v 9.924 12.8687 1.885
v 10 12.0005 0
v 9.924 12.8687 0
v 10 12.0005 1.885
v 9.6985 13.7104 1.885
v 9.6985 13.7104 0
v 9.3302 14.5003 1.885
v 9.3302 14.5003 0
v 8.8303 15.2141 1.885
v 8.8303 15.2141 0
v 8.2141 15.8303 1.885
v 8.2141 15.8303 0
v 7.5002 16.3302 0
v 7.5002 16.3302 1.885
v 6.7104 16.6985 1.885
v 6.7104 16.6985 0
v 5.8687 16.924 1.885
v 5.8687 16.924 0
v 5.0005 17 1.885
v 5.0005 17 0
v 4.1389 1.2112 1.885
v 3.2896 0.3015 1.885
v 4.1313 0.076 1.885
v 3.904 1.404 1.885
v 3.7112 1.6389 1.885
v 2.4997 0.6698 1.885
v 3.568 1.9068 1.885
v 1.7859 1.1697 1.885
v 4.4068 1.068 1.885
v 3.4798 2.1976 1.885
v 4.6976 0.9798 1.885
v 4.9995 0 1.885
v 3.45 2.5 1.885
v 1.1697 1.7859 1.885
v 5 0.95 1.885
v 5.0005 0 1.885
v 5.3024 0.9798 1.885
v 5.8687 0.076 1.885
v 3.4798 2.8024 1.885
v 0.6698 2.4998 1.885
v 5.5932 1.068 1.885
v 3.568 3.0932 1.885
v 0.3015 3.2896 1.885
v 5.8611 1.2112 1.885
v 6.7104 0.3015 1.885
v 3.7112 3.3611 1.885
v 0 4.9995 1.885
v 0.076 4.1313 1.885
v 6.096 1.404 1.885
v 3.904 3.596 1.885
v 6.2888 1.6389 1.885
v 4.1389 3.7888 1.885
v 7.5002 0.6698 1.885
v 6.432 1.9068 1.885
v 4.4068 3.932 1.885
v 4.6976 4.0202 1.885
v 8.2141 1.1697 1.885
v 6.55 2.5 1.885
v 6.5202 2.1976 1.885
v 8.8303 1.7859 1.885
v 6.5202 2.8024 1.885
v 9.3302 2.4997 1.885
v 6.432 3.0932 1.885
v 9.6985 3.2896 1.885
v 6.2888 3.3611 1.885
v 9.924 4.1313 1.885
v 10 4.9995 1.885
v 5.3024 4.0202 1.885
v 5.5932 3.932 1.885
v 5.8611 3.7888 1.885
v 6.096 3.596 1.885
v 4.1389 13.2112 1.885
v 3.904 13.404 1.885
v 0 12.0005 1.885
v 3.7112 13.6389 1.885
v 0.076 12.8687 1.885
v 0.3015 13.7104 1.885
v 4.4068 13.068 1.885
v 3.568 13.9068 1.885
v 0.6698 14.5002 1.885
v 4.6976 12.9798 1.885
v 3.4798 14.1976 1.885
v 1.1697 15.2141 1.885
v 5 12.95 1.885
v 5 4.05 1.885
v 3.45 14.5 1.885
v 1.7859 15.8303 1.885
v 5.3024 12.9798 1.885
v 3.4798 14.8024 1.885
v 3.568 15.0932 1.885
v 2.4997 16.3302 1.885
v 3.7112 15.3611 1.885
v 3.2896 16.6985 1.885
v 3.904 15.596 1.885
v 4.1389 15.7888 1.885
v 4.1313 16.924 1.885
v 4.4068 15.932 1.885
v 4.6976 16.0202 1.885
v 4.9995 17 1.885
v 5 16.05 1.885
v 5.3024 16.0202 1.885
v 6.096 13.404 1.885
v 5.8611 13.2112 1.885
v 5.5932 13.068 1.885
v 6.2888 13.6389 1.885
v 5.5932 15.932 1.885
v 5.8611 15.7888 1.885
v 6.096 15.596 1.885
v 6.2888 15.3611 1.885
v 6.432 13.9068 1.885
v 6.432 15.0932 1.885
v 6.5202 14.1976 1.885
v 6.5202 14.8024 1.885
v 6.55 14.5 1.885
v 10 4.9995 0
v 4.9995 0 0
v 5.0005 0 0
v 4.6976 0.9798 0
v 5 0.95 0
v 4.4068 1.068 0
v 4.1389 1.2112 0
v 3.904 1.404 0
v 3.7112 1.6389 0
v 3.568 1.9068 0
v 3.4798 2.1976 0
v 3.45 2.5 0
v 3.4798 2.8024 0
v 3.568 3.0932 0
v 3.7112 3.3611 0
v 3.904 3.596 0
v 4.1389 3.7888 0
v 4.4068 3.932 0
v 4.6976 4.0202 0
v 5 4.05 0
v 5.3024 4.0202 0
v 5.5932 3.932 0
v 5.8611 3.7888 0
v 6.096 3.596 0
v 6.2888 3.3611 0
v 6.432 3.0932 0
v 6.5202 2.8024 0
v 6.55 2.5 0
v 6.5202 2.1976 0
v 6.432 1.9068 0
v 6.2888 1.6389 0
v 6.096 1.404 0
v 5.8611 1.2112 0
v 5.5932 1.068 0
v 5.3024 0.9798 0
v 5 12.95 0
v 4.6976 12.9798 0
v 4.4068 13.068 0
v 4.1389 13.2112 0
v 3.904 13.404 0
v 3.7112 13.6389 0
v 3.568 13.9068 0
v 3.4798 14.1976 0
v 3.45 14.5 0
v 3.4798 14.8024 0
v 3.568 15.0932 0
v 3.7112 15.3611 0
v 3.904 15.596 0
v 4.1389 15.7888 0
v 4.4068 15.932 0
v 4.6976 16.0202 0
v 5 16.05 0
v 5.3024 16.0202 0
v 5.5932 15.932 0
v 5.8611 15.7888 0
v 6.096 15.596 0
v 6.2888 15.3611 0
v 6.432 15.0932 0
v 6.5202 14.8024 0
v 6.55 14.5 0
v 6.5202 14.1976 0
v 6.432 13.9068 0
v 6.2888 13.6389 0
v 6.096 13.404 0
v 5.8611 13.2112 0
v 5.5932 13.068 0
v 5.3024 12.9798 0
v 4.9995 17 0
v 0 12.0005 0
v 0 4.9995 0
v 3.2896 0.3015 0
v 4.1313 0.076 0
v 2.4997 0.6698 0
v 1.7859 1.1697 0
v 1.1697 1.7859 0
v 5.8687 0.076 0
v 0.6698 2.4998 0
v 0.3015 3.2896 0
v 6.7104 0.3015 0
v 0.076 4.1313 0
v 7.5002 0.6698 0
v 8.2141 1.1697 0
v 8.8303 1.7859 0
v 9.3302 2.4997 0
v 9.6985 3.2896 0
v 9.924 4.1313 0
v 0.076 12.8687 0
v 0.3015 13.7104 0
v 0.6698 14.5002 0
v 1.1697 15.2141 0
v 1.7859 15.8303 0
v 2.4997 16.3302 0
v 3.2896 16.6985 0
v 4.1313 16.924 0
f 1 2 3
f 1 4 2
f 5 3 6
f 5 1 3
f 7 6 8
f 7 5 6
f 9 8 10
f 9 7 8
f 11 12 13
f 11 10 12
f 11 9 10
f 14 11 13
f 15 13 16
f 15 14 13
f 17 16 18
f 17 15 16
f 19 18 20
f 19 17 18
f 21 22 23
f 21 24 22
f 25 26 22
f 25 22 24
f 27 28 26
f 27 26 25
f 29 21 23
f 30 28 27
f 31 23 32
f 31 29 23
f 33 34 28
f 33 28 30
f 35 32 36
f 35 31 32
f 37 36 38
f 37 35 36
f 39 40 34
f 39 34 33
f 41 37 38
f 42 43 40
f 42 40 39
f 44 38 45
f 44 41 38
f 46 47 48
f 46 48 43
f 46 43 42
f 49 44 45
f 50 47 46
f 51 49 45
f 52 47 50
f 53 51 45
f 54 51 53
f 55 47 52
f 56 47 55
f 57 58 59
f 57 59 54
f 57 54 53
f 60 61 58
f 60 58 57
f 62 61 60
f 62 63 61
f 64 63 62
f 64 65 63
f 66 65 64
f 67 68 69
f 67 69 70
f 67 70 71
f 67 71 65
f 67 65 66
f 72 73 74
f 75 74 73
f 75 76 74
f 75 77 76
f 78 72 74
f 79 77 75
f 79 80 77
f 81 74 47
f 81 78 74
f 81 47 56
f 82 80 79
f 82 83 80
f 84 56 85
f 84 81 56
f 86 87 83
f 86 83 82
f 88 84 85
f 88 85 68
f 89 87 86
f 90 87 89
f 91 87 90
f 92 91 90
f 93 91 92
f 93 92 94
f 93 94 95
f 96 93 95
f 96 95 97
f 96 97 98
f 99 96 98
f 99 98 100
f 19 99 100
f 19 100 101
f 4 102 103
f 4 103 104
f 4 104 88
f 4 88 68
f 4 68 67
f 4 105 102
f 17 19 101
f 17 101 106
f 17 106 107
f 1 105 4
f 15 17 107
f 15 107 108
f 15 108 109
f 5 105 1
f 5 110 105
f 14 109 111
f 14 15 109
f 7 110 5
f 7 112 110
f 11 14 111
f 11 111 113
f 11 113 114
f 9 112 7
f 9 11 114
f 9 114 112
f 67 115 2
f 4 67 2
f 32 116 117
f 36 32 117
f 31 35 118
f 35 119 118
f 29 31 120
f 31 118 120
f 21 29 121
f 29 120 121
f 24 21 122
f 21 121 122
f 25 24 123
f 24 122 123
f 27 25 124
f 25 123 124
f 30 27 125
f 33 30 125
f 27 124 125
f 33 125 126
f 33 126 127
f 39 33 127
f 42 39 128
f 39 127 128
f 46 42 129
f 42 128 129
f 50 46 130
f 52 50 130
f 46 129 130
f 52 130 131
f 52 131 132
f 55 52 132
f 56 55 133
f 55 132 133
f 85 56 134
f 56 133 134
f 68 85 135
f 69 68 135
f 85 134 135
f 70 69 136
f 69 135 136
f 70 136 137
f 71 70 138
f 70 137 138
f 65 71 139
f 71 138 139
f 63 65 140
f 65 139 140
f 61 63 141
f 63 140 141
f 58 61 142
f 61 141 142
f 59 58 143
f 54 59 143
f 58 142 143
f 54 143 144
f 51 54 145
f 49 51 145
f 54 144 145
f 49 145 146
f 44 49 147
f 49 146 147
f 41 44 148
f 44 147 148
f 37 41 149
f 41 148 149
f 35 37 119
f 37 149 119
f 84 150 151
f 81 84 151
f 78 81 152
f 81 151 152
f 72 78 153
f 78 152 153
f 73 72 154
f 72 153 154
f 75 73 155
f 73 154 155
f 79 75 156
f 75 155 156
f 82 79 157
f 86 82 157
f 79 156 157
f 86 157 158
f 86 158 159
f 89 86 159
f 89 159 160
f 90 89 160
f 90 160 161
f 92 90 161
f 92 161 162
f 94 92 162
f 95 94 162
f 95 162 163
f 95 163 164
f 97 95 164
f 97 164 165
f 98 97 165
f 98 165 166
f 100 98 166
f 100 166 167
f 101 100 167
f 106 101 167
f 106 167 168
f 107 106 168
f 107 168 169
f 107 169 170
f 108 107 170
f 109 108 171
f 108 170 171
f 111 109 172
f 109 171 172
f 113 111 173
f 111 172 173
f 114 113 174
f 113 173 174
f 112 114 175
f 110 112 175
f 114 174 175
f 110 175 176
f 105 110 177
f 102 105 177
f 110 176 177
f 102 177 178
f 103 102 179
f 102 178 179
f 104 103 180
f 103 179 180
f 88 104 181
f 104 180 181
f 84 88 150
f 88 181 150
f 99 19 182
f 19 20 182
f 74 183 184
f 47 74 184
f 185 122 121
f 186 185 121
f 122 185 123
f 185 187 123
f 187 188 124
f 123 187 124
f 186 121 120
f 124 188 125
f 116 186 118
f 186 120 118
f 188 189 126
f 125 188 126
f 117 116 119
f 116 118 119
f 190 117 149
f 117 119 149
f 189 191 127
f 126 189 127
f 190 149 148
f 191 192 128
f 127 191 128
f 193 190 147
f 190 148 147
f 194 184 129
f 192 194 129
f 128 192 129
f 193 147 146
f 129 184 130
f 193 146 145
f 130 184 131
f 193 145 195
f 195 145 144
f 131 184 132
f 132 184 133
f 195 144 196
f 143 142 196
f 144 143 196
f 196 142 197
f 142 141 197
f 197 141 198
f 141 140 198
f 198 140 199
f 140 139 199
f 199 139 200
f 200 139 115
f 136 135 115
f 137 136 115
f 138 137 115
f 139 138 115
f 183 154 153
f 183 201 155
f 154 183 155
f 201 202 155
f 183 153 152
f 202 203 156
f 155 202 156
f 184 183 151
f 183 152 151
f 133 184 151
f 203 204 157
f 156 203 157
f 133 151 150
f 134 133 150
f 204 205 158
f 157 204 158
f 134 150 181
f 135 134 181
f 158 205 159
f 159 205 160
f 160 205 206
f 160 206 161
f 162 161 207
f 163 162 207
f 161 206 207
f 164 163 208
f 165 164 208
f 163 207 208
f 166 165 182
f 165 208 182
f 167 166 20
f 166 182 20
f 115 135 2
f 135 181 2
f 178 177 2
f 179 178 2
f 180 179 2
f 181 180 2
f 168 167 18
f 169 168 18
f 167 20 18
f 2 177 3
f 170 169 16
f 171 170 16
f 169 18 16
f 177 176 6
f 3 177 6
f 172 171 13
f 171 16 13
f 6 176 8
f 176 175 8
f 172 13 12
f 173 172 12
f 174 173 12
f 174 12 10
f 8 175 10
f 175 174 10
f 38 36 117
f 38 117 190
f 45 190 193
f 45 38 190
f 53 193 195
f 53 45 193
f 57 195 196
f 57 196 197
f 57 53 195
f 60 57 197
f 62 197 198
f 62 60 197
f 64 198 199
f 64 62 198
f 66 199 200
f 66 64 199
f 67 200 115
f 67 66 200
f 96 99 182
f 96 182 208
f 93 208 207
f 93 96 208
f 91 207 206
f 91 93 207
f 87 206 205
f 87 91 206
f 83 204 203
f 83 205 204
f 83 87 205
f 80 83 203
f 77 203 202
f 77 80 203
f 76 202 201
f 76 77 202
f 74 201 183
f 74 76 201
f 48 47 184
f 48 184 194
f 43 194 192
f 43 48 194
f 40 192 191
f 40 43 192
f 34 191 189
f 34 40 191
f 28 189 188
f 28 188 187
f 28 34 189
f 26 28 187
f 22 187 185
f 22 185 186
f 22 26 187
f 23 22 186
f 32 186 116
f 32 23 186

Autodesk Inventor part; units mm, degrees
ref_plane "YZ Plane" through (0, 0, 0) normal (1, 0, 0) x (0, 1, 0)
ref_plane "XZ Plane" through (0, 0, 0) normal (0, 1, 0) x (-1, 0, 0)
ref_plane "XY Plane" through (0, 0, 0) normal (0, 0, 1) x (1, 0, 0)
sketch "スケッチ1" plane through (0, 0, 0) normal (0, 0, 1) x (1, 0, 0)
  line L0 (0, 0) -> (10, 0)
  line L1 (10, 0) -> (10, 17)
  line L2 (10, 17) -> (0, 17)
  line L3 (0, 17) -> (0, 0)
  dimension "d0" = 17
  dimension "d1" = 10
extrude "押し出し1" add sketch "スケッチ1" along normal blind 1.885
sketch "スケッチ2" plane through (0, 0, 1.885) normal (0, 0, 1) x (1, 0, 0)
  line L0 (0, 17) -> (0, 0) projected
  line L1 (0, 8.5) -> (10, 8.5)
  line L2 (10, 0) -> (10, 17) projected
  line L3 (10, 17) -> (0, 17) projected
  line L4 (5, 17) -> (5, 0)
  line L5 (0, 0) -> (10, 0) projected
  line L6 (0, 17) -> (10, 17)
  point P0 (5, 14.5)
  point P1 (5, 2.5)
  dimension "d4" = 6
hole "穴1" at (5, 14.5, 1.885) at (5, 2.5, 1.885) direction (0, 0, -1) diameter 3.1 end through all
fillet "フィレット1" radius 5 4 edges at (0, 17, 0.9425) (10, 17, 0.9425) (10, 0, 0.9425) (0, 0, 0.9425)
properties part number "link2part4"
